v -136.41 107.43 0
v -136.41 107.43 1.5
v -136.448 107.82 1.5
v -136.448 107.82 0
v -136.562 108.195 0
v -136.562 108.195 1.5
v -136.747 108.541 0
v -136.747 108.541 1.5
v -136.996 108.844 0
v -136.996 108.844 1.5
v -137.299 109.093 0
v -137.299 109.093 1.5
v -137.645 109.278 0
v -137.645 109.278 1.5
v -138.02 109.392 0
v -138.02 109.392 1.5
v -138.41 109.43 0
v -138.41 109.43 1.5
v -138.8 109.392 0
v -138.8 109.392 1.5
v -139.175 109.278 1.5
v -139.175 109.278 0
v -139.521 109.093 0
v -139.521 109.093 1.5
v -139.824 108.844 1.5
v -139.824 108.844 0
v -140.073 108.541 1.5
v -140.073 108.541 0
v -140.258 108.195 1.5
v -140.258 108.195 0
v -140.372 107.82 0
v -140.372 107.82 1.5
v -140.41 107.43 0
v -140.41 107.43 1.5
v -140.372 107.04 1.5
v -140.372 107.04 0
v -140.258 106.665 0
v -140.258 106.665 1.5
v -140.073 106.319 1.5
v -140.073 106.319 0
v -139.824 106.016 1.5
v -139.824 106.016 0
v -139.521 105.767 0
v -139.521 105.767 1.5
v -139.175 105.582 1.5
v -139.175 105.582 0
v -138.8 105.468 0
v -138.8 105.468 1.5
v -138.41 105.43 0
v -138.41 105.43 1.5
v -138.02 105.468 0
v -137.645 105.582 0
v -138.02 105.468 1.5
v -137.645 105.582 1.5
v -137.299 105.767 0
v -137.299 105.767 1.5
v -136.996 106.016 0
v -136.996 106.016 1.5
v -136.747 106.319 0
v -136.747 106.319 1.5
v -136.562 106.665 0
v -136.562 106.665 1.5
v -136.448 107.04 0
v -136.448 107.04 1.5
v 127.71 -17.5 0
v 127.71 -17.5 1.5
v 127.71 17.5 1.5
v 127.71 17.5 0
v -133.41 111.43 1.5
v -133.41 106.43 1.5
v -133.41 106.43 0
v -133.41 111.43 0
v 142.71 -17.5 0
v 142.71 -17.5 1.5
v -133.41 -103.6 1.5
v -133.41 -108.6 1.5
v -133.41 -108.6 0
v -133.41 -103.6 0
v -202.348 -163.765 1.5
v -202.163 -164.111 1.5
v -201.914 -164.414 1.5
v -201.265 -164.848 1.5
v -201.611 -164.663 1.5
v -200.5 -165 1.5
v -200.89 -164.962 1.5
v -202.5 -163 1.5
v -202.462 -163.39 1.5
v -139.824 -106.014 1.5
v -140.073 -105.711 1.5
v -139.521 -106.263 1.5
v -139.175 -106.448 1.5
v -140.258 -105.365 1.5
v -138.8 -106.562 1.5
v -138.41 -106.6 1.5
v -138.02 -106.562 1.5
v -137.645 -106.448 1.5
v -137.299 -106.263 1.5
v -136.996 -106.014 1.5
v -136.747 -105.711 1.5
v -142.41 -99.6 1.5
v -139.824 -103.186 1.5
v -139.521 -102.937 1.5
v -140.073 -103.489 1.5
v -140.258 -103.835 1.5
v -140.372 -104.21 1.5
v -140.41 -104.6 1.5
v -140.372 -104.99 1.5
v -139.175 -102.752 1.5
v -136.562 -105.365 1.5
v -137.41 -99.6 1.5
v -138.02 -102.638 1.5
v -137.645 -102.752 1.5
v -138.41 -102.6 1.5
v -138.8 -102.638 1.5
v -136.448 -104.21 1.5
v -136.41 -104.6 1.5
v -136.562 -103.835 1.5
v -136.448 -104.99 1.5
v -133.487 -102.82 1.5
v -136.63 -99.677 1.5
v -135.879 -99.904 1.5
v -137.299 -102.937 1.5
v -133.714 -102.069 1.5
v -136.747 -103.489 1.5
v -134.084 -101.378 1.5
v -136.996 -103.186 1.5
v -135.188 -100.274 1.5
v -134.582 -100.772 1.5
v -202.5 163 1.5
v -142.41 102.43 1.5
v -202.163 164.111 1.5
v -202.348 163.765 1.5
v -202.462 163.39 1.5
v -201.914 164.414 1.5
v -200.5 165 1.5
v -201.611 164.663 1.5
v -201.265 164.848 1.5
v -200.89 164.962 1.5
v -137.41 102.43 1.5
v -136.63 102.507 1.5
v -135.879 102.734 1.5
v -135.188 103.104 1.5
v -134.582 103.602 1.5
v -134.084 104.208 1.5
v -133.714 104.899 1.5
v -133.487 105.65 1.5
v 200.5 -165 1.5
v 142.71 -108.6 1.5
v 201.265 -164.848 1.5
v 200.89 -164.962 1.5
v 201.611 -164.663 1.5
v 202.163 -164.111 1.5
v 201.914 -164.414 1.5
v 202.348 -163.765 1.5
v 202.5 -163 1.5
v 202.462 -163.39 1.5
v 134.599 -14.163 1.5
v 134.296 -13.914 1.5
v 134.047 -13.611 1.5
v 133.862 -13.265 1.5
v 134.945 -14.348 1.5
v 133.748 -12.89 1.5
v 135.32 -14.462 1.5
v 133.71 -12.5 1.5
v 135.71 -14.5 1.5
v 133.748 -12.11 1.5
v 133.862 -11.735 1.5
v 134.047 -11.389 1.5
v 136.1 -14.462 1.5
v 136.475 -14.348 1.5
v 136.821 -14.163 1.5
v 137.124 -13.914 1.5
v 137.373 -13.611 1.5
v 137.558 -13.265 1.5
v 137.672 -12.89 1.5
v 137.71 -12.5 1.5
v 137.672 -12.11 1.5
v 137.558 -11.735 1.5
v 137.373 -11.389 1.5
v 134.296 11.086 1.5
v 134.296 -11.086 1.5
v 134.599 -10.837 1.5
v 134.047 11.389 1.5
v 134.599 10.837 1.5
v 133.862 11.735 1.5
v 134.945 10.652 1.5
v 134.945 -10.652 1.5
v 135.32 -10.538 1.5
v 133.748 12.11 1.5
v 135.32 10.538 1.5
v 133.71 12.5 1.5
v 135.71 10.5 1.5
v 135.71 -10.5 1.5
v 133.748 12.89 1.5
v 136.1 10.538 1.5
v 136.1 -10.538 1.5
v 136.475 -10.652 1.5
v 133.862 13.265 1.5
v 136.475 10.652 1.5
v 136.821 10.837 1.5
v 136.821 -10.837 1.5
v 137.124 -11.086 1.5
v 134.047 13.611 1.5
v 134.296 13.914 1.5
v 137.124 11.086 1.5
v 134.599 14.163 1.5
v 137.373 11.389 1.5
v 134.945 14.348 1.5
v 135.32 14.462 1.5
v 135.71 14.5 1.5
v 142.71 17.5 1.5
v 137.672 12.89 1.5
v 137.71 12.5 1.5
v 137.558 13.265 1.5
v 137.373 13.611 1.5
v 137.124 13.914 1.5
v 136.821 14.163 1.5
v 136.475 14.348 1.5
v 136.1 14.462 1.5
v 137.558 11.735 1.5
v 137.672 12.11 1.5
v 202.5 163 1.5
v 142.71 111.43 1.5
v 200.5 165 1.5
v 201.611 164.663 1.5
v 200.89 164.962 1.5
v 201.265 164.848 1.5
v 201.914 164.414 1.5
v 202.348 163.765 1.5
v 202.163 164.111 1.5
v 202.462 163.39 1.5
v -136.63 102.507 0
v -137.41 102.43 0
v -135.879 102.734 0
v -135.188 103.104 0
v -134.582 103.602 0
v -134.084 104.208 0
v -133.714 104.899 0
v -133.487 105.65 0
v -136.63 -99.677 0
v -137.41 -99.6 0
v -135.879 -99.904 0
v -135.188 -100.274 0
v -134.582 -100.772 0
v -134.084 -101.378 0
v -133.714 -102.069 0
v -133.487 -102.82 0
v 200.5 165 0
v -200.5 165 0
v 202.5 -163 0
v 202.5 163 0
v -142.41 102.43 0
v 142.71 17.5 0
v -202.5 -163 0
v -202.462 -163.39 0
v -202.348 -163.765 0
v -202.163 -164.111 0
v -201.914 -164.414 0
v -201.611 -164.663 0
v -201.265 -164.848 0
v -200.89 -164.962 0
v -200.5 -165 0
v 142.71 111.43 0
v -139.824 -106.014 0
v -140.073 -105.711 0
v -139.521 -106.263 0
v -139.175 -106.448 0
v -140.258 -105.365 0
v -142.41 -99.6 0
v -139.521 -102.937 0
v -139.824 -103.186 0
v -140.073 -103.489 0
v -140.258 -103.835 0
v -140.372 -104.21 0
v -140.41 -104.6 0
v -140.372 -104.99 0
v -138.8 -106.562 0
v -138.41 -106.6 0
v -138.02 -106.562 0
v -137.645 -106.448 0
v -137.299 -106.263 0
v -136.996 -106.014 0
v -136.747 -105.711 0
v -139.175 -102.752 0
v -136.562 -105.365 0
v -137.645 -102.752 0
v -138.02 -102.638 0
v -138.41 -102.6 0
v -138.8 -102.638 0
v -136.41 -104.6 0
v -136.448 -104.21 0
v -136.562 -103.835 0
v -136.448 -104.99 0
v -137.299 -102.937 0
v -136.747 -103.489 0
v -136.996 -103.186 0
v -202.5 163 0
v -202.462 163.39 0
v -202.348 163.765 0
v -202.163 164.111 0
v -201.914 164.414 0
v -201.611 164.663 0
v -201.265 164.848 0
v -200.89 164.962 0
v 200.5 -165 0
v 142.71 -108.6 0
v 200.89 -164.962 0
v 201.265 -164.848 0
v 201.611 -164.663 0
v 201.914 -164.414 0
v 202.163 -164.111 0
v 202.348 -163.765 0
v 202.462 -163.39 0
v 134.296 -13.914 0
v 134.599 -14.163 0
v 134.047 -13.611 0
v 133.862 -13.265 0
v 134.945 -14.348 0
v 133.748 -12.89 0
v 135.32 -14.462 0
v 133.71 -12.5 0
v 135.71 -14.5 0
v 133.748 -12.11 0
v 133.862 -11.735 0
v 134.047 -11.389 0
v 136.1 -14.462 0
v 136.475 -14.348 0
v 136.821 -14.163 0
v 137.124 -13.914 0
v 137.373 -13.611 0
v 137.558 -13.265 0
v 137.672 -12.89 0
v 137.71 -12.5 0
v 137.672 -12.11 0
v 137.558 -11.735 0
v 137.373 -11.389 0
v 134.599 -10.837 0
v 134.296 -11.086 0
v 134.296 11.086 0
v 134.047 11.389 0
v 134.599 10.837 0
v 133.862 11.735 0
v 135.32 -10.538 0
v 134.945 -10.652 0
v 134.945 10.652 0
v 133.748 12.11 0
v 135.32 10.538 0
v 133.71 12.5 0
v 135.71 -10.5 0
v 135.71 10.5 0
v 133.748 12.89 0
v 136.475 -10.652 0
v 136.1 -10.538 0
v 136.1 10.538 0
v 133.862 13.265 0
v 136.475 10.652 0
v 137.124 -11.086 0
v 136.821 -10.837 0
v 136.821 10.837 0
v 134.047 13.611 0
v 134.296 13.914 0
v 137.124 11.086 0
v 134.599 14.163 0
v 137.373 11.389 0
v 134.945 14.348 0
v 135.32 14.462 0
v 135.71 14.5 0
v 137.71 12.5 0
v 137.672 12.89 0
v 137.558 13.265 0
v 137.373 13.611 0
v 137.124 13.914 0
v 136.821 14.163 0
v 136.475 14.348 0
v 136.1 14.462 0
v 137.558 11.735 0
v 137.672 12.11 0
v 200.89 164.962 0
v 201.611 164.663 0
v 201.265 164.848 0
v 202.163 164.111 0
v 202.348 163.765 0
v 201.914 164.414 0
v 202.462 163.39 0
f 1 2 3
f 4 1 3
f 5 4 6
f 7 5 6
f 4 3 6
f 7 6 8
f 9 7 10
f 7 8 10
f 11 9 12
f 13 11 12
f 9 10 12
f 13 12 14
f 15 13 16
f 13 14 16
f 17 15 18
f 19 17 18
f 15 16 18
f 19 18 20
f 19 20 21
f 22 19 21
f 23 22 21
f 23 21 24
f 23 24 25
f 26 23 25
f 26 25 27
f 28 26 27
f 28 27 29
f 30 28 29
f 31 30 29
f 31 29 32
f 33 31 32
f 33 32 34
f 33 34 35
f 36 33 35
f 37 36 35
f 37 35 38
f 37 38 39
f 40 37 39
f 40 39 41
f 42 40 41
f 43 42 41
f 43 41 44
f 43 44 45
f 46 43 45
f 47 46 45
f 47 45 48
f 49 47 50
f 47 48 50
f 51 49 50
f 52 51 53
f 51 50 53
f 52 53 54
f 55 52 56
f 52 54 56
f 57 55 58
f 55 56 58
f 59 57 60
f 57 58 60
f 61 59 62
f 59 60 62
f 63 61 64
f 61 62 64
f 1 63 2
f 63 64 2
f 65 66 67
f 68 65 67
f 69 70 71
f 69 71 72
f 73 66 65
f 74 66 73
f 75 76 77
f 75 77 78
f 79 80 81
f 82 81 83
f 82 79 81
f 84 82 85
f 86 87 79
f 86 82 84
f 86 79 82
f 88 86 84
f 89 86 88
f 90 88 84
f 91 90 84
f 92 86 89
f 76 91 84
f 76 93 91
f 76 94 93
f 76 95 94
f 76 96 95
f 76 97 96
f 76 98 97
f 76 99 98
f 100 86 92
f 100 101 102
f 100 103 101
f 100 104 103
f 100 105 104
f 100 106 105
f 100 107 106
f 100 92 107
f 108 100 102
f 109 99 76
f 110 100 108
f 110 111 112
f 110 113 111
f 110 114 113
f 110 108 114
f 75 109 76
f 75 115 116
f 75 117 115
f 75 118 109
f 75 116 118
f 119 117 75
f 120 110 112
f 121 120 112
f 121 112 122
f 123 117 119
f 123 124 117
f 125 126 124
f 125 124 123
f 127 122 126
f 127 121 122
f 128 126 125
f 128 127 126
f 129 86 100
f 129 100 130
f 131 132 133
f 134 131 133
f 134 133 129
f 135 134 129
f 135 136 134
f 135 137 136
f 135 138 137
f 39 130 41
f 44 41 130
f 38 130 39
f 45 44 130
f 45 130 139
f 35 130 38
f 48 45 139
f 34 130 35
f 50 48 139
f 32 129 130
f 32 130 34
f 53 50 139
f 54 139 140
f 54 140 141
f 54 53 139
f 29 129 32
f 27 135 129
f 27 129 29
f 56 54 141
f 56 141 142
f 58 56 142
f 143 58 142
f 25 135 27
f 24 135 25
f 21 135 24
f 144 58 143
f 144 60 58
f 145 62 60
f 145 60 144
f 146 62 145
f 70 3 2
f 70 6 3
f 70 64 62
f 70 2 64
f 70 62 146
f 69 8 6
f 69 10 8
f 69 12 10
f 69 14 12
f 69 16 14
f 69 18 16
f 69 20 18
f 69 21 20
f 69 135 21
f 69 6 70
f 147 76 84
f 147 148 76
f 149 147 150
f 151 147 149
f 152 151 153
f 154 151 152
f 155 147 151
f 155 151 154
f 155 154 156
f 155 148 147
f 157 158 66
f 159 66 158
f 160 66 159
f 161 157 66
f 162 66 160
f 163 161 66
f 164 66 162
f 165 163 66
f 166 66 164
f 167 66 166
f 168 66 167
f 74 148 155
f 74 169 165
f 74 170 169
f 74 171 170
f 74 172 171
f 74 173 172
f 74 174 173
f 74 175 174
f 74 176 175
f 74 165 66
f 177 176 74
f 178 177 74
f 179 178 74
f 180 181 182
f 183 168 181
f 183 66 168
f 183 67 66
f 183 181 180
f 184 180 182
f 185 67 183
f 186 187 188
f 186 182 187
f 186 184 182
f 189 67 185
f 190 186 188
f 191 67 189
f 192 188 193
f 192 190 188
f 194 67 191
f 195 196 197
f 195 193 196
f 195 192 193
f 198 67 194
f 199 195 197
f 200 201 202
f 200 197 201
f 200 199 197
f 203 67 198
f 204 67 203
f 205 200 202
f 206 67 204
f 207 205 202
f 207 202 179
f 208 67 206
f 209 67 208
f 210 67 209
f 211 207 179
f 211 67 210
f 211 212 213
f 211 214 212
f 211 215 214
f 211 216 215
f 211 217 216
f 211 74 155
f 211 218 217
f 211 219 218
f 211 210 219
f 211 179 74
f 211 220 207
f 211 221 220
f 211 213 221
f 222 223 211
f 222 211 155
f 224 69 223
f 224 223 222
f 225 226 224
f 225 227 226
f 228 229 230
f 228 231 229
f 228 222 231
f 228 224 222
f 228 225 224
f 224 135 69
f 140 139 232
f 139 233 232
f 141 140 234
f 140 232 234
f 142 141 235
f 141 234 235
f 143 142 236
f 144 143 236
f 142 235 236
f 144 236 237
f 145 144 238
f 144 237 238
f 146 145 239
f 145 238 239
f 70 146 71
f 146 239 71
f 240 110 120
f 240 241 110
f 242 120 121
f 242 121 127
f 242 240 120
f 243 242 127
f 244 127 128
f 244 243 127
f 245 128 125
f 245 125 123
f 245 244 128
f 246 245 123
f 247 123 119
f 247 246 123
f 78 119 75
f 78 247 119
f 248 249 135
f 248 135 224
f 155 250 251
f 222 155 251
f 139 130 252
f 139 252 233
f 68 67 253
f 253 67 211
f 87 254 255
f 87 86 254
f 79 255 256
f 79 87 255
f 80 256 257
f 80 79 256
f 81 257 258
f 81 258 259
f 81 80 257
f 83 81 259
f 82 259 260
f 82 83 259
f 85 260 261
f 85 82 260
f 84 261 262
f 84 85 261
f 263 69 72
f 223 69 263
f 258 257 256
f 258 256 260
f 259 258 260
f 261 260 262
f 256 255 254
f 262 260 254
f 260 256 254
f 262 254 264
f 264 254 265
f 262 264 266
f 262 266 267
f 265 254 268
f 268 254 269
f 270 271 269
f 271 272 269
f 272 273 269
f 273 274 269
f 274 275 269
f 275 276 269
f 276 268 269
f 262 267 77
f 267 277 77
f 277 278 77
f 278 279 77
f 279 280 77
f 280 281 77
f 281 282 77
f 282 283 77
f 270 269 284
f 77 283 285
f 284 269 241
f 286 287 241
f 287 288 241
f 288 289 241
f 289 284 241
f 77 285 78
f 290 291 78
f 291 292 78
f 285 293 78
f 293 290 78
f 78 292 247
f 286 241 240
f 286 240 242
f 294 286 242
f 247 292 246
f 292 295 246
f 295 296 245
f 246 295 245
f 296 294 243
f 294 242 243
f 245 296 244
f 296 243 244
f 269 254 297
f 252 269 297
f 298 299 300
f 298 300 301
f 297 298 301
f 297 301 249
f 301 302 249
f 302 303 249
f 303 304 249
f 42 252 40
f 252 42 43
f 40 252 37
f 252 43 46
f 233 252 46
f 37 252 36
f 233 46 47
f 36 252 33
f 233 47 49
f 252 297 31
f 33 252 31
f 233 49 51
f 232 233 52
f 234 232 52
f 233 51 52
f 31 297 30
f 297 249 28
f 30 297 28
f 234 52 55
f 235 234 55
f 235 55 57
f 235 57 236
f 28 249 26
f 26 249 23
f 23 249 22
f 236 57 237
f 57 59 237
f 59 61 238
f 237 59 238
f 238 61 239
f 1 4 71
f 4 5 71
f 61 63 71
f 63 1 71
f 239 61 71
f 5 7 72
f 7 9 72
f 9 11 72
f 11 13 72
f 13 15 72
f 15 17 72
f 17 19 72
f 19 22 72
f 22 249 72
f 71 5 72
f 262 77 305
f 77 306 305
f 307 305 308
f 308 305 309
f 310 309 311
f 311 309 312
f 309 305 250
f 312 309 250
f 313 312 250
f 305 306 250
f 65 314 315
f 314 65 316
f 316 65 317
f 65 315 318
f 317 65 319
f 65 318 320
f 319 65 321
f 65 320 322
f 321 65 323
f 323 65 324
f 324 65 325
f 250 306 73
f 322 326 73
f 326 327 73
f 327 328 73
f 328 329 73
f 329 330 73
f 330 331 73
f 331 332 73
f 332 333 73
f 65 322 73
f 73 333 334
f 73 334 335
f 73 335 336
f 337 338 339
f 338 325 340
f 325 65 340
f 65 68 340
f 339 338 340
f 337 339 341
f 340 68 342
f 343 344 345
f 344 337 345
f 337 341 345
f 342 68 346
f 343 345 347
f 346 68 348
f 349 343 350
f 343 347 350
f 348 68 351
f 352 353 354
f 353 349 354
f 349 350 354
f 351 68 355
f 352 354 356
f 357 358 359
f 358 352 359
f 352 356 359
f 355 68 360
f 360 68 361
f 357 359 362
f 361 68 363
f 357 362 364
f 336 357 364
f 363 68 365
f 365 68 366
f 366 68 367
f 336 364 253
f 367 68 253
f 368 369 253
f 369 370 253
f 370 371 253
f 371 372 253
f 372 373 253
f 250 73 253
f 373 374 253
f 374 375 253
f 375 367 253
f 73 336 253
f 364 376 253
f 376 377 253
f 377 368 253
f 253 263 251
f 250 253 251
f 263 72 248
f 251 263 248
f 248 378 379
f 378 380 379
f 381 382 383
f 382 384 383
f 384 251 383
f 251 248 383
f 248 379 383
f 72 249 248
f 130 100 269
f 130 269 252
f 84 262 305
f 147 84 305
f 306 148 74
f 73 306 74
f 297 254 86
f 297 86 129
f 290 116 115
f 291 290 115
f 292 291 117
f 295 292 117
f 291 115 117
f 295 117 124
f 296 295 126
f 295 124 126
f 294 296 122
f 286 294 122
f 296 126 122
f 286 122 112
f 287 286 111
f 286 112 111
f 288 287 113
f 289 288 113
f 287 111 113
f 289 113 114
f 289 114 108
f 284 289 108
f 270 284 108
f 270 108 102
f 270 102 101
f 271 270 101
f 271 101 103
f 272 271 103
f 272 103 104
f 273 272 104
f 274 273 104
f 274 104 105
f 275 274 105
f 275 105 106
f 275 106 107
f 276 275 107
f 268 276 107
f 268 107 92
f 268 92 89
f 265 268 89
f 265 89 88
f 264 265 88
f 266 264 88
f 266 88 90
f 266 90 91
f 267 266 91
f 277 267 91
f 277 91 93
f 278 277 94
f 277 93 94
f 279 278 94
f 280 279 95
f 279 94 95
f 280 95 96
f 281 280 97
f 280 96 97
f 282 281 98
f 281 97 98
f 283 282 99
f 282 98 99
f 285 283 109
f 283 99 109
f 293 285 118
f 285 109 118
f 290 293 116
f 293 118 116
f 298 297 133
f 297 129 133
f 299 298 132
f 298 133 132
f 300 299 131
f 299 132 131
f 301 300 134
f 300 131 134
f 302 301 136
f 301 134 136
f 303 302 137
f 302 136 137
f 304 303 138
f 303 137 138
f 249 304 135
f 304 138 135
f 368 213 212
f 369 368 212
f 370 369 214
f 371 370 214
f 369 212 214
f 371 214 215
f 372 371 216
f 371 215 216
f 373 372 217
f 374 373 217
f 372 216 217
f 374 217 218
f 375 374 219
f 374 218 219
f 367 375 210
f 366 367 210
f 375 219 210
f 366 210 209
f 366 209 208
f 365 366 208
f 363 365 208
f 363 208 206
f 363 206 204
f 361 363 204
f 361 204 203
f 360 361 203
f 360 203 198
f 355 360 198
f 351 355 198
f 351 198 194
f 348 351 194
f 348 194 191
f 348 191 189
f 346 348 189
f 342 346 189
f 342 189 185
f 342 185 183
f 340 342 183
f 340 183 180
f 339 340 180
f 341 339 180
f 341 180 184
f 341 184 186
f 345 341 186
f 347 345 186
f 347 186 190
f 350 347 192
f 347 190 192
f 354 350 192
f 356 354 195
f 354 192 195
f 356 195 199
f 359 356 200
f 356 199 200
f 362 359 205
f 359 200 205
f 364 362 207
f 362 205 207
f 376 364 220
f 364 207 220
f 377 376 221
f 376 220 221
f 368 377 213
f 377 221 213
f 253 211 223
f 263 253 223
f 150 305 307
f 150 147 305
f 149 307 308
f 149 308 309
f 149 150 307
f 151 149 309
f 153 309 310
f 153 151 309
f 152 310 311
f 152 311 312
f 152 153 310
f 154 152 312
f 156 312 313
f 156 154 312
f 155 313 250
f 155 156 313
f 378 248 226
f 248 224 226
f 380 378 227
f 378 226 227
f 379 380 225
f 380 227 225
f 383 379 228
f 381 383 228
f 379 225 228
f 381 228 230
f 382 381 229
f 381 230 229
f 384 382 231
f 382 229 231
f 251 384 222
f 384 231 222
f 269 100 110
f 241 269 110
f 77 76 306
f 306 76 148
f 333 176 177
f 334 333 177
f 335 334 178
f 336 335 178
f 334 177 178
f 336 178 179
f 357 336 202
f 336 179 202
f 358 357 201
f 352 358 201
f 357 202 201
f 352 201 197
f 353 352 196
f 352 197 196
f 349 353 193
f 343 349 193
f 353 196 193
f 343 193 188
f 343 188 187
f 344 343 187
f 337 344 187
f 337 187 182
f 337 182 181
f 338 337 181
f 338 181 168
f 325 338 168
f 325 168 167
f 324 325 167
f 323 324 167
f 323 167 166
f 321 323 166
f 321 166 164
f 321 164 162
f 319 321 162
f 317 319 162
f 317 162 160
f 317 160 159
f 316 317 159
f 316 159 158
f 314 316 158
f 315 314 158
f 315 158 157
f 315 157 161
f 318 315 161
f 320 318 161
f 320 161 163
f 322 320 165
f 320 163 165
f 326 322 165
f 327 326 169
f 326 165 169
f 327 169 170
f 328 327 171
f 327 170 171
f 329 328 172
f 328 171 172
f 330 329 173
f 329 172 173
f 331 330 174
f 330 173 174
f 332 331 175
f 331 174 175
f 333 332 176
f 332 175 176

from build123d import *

# Parameters (mm, degrees)
SKETCH1_W           = 405
SKETCH1_H           = 330
BOSS_EXTRUDE1_DEPTH = 1.5
SKETCH2_W           = 285.12
SKETCH2_H           = 220.03
CUT_EXTRUDE1_DEPTH  = 2.5
SKETCH3_W           = 9
SKETCH3_H           = 9
SKETCH3_W_2         = 15
SKETCH3_H_2         = 35
BOSS_EXTRUDE2_DEPTH = 1.5
SKETCH4_R           = 2
CUT_EXTRUDE2_DEPTH  = 2.5
FILLET1_R           = 4
FILLET2_R           = 2


with BuildPart() as part:
    # Sketch1 → Boss-Extrude1 (new body)
    with BuildSketch(Plane.XY):
        Rectangle(SKETCH1_W, SKETCH1_H)
    extrude(amount=BOSS_EXTRUDE1_DEPTH)

    # Sketch2 → Cut-Extrude1 (cut, through all)
    with BuildSketch(Plane.XY.offset(1.5)):
        with Locations((0.15, 1.415)):
            Rectangle(SKETCH2_W, SKETCH2_H)
    extrude(amount=-CUT_EXTRUDE1_DEPTH, mode=Mode.SUBTRACT)

    # Sketch3 → Boss-Extrude2 (add)
    with BuildSketch(Plane.XY.offset(1.5)):
        with Locations((-137.91, 106.93)):
            Rectangle(SKETCH3_W, SKETCH3_H)
        with Locations((-137.91, -104.1)):
            Rectangle(SKETCH3_W, SKETCH3_H)
        with Locations((135.21, 0)):
            Rectangle(SKETCH3_W_2, SKETCH3_H_2)
    extrude(amount=-BOSS_EXTRUDE2_DEPTH)

    # Sketch4 → Cut-Extrude2 (cut, through all)
    with BuildSketch(Plane.XY.offset(1.5)):
        with Locations((-138.41, 107.43)):
            Circle(SKETCH4_R)
        with Locations((-138.41, -104.6)):
            Circle(SKETCH4_R)
        with Locations((135.71, 12.5)):
            Circle(SKETCH4_R)
        with Locations((135.71, -12.5)):
            Circle(SKETCH4_R)
    extrude(amount=-CUT_EXTRUDE2_DEPTH, mode=Mode.SUBTRACT)

    # Fillet1
    fillet1_edges = [part.edges().sort_by_distance(p)[0] for p in [
        (-133.41, 102.43, 0.75),
        (-133.41, -99.6, 0.75),
    ]]
    fillet(fillet1_edges, radius=FILLET1_R)

    # Fillet2
    fillet2_edges = [part.edges().sort_by_distance(p)[0] for p in [
        (202.5, -165, 0.75),
        (-202.5, -165, 0.75),
        (-202.5, 165, 0.75),
        (202.5, 165, 0.75),
    ]]
    fillet(fillet2_edges, radius=FILLET2_R)


solid = part.part
